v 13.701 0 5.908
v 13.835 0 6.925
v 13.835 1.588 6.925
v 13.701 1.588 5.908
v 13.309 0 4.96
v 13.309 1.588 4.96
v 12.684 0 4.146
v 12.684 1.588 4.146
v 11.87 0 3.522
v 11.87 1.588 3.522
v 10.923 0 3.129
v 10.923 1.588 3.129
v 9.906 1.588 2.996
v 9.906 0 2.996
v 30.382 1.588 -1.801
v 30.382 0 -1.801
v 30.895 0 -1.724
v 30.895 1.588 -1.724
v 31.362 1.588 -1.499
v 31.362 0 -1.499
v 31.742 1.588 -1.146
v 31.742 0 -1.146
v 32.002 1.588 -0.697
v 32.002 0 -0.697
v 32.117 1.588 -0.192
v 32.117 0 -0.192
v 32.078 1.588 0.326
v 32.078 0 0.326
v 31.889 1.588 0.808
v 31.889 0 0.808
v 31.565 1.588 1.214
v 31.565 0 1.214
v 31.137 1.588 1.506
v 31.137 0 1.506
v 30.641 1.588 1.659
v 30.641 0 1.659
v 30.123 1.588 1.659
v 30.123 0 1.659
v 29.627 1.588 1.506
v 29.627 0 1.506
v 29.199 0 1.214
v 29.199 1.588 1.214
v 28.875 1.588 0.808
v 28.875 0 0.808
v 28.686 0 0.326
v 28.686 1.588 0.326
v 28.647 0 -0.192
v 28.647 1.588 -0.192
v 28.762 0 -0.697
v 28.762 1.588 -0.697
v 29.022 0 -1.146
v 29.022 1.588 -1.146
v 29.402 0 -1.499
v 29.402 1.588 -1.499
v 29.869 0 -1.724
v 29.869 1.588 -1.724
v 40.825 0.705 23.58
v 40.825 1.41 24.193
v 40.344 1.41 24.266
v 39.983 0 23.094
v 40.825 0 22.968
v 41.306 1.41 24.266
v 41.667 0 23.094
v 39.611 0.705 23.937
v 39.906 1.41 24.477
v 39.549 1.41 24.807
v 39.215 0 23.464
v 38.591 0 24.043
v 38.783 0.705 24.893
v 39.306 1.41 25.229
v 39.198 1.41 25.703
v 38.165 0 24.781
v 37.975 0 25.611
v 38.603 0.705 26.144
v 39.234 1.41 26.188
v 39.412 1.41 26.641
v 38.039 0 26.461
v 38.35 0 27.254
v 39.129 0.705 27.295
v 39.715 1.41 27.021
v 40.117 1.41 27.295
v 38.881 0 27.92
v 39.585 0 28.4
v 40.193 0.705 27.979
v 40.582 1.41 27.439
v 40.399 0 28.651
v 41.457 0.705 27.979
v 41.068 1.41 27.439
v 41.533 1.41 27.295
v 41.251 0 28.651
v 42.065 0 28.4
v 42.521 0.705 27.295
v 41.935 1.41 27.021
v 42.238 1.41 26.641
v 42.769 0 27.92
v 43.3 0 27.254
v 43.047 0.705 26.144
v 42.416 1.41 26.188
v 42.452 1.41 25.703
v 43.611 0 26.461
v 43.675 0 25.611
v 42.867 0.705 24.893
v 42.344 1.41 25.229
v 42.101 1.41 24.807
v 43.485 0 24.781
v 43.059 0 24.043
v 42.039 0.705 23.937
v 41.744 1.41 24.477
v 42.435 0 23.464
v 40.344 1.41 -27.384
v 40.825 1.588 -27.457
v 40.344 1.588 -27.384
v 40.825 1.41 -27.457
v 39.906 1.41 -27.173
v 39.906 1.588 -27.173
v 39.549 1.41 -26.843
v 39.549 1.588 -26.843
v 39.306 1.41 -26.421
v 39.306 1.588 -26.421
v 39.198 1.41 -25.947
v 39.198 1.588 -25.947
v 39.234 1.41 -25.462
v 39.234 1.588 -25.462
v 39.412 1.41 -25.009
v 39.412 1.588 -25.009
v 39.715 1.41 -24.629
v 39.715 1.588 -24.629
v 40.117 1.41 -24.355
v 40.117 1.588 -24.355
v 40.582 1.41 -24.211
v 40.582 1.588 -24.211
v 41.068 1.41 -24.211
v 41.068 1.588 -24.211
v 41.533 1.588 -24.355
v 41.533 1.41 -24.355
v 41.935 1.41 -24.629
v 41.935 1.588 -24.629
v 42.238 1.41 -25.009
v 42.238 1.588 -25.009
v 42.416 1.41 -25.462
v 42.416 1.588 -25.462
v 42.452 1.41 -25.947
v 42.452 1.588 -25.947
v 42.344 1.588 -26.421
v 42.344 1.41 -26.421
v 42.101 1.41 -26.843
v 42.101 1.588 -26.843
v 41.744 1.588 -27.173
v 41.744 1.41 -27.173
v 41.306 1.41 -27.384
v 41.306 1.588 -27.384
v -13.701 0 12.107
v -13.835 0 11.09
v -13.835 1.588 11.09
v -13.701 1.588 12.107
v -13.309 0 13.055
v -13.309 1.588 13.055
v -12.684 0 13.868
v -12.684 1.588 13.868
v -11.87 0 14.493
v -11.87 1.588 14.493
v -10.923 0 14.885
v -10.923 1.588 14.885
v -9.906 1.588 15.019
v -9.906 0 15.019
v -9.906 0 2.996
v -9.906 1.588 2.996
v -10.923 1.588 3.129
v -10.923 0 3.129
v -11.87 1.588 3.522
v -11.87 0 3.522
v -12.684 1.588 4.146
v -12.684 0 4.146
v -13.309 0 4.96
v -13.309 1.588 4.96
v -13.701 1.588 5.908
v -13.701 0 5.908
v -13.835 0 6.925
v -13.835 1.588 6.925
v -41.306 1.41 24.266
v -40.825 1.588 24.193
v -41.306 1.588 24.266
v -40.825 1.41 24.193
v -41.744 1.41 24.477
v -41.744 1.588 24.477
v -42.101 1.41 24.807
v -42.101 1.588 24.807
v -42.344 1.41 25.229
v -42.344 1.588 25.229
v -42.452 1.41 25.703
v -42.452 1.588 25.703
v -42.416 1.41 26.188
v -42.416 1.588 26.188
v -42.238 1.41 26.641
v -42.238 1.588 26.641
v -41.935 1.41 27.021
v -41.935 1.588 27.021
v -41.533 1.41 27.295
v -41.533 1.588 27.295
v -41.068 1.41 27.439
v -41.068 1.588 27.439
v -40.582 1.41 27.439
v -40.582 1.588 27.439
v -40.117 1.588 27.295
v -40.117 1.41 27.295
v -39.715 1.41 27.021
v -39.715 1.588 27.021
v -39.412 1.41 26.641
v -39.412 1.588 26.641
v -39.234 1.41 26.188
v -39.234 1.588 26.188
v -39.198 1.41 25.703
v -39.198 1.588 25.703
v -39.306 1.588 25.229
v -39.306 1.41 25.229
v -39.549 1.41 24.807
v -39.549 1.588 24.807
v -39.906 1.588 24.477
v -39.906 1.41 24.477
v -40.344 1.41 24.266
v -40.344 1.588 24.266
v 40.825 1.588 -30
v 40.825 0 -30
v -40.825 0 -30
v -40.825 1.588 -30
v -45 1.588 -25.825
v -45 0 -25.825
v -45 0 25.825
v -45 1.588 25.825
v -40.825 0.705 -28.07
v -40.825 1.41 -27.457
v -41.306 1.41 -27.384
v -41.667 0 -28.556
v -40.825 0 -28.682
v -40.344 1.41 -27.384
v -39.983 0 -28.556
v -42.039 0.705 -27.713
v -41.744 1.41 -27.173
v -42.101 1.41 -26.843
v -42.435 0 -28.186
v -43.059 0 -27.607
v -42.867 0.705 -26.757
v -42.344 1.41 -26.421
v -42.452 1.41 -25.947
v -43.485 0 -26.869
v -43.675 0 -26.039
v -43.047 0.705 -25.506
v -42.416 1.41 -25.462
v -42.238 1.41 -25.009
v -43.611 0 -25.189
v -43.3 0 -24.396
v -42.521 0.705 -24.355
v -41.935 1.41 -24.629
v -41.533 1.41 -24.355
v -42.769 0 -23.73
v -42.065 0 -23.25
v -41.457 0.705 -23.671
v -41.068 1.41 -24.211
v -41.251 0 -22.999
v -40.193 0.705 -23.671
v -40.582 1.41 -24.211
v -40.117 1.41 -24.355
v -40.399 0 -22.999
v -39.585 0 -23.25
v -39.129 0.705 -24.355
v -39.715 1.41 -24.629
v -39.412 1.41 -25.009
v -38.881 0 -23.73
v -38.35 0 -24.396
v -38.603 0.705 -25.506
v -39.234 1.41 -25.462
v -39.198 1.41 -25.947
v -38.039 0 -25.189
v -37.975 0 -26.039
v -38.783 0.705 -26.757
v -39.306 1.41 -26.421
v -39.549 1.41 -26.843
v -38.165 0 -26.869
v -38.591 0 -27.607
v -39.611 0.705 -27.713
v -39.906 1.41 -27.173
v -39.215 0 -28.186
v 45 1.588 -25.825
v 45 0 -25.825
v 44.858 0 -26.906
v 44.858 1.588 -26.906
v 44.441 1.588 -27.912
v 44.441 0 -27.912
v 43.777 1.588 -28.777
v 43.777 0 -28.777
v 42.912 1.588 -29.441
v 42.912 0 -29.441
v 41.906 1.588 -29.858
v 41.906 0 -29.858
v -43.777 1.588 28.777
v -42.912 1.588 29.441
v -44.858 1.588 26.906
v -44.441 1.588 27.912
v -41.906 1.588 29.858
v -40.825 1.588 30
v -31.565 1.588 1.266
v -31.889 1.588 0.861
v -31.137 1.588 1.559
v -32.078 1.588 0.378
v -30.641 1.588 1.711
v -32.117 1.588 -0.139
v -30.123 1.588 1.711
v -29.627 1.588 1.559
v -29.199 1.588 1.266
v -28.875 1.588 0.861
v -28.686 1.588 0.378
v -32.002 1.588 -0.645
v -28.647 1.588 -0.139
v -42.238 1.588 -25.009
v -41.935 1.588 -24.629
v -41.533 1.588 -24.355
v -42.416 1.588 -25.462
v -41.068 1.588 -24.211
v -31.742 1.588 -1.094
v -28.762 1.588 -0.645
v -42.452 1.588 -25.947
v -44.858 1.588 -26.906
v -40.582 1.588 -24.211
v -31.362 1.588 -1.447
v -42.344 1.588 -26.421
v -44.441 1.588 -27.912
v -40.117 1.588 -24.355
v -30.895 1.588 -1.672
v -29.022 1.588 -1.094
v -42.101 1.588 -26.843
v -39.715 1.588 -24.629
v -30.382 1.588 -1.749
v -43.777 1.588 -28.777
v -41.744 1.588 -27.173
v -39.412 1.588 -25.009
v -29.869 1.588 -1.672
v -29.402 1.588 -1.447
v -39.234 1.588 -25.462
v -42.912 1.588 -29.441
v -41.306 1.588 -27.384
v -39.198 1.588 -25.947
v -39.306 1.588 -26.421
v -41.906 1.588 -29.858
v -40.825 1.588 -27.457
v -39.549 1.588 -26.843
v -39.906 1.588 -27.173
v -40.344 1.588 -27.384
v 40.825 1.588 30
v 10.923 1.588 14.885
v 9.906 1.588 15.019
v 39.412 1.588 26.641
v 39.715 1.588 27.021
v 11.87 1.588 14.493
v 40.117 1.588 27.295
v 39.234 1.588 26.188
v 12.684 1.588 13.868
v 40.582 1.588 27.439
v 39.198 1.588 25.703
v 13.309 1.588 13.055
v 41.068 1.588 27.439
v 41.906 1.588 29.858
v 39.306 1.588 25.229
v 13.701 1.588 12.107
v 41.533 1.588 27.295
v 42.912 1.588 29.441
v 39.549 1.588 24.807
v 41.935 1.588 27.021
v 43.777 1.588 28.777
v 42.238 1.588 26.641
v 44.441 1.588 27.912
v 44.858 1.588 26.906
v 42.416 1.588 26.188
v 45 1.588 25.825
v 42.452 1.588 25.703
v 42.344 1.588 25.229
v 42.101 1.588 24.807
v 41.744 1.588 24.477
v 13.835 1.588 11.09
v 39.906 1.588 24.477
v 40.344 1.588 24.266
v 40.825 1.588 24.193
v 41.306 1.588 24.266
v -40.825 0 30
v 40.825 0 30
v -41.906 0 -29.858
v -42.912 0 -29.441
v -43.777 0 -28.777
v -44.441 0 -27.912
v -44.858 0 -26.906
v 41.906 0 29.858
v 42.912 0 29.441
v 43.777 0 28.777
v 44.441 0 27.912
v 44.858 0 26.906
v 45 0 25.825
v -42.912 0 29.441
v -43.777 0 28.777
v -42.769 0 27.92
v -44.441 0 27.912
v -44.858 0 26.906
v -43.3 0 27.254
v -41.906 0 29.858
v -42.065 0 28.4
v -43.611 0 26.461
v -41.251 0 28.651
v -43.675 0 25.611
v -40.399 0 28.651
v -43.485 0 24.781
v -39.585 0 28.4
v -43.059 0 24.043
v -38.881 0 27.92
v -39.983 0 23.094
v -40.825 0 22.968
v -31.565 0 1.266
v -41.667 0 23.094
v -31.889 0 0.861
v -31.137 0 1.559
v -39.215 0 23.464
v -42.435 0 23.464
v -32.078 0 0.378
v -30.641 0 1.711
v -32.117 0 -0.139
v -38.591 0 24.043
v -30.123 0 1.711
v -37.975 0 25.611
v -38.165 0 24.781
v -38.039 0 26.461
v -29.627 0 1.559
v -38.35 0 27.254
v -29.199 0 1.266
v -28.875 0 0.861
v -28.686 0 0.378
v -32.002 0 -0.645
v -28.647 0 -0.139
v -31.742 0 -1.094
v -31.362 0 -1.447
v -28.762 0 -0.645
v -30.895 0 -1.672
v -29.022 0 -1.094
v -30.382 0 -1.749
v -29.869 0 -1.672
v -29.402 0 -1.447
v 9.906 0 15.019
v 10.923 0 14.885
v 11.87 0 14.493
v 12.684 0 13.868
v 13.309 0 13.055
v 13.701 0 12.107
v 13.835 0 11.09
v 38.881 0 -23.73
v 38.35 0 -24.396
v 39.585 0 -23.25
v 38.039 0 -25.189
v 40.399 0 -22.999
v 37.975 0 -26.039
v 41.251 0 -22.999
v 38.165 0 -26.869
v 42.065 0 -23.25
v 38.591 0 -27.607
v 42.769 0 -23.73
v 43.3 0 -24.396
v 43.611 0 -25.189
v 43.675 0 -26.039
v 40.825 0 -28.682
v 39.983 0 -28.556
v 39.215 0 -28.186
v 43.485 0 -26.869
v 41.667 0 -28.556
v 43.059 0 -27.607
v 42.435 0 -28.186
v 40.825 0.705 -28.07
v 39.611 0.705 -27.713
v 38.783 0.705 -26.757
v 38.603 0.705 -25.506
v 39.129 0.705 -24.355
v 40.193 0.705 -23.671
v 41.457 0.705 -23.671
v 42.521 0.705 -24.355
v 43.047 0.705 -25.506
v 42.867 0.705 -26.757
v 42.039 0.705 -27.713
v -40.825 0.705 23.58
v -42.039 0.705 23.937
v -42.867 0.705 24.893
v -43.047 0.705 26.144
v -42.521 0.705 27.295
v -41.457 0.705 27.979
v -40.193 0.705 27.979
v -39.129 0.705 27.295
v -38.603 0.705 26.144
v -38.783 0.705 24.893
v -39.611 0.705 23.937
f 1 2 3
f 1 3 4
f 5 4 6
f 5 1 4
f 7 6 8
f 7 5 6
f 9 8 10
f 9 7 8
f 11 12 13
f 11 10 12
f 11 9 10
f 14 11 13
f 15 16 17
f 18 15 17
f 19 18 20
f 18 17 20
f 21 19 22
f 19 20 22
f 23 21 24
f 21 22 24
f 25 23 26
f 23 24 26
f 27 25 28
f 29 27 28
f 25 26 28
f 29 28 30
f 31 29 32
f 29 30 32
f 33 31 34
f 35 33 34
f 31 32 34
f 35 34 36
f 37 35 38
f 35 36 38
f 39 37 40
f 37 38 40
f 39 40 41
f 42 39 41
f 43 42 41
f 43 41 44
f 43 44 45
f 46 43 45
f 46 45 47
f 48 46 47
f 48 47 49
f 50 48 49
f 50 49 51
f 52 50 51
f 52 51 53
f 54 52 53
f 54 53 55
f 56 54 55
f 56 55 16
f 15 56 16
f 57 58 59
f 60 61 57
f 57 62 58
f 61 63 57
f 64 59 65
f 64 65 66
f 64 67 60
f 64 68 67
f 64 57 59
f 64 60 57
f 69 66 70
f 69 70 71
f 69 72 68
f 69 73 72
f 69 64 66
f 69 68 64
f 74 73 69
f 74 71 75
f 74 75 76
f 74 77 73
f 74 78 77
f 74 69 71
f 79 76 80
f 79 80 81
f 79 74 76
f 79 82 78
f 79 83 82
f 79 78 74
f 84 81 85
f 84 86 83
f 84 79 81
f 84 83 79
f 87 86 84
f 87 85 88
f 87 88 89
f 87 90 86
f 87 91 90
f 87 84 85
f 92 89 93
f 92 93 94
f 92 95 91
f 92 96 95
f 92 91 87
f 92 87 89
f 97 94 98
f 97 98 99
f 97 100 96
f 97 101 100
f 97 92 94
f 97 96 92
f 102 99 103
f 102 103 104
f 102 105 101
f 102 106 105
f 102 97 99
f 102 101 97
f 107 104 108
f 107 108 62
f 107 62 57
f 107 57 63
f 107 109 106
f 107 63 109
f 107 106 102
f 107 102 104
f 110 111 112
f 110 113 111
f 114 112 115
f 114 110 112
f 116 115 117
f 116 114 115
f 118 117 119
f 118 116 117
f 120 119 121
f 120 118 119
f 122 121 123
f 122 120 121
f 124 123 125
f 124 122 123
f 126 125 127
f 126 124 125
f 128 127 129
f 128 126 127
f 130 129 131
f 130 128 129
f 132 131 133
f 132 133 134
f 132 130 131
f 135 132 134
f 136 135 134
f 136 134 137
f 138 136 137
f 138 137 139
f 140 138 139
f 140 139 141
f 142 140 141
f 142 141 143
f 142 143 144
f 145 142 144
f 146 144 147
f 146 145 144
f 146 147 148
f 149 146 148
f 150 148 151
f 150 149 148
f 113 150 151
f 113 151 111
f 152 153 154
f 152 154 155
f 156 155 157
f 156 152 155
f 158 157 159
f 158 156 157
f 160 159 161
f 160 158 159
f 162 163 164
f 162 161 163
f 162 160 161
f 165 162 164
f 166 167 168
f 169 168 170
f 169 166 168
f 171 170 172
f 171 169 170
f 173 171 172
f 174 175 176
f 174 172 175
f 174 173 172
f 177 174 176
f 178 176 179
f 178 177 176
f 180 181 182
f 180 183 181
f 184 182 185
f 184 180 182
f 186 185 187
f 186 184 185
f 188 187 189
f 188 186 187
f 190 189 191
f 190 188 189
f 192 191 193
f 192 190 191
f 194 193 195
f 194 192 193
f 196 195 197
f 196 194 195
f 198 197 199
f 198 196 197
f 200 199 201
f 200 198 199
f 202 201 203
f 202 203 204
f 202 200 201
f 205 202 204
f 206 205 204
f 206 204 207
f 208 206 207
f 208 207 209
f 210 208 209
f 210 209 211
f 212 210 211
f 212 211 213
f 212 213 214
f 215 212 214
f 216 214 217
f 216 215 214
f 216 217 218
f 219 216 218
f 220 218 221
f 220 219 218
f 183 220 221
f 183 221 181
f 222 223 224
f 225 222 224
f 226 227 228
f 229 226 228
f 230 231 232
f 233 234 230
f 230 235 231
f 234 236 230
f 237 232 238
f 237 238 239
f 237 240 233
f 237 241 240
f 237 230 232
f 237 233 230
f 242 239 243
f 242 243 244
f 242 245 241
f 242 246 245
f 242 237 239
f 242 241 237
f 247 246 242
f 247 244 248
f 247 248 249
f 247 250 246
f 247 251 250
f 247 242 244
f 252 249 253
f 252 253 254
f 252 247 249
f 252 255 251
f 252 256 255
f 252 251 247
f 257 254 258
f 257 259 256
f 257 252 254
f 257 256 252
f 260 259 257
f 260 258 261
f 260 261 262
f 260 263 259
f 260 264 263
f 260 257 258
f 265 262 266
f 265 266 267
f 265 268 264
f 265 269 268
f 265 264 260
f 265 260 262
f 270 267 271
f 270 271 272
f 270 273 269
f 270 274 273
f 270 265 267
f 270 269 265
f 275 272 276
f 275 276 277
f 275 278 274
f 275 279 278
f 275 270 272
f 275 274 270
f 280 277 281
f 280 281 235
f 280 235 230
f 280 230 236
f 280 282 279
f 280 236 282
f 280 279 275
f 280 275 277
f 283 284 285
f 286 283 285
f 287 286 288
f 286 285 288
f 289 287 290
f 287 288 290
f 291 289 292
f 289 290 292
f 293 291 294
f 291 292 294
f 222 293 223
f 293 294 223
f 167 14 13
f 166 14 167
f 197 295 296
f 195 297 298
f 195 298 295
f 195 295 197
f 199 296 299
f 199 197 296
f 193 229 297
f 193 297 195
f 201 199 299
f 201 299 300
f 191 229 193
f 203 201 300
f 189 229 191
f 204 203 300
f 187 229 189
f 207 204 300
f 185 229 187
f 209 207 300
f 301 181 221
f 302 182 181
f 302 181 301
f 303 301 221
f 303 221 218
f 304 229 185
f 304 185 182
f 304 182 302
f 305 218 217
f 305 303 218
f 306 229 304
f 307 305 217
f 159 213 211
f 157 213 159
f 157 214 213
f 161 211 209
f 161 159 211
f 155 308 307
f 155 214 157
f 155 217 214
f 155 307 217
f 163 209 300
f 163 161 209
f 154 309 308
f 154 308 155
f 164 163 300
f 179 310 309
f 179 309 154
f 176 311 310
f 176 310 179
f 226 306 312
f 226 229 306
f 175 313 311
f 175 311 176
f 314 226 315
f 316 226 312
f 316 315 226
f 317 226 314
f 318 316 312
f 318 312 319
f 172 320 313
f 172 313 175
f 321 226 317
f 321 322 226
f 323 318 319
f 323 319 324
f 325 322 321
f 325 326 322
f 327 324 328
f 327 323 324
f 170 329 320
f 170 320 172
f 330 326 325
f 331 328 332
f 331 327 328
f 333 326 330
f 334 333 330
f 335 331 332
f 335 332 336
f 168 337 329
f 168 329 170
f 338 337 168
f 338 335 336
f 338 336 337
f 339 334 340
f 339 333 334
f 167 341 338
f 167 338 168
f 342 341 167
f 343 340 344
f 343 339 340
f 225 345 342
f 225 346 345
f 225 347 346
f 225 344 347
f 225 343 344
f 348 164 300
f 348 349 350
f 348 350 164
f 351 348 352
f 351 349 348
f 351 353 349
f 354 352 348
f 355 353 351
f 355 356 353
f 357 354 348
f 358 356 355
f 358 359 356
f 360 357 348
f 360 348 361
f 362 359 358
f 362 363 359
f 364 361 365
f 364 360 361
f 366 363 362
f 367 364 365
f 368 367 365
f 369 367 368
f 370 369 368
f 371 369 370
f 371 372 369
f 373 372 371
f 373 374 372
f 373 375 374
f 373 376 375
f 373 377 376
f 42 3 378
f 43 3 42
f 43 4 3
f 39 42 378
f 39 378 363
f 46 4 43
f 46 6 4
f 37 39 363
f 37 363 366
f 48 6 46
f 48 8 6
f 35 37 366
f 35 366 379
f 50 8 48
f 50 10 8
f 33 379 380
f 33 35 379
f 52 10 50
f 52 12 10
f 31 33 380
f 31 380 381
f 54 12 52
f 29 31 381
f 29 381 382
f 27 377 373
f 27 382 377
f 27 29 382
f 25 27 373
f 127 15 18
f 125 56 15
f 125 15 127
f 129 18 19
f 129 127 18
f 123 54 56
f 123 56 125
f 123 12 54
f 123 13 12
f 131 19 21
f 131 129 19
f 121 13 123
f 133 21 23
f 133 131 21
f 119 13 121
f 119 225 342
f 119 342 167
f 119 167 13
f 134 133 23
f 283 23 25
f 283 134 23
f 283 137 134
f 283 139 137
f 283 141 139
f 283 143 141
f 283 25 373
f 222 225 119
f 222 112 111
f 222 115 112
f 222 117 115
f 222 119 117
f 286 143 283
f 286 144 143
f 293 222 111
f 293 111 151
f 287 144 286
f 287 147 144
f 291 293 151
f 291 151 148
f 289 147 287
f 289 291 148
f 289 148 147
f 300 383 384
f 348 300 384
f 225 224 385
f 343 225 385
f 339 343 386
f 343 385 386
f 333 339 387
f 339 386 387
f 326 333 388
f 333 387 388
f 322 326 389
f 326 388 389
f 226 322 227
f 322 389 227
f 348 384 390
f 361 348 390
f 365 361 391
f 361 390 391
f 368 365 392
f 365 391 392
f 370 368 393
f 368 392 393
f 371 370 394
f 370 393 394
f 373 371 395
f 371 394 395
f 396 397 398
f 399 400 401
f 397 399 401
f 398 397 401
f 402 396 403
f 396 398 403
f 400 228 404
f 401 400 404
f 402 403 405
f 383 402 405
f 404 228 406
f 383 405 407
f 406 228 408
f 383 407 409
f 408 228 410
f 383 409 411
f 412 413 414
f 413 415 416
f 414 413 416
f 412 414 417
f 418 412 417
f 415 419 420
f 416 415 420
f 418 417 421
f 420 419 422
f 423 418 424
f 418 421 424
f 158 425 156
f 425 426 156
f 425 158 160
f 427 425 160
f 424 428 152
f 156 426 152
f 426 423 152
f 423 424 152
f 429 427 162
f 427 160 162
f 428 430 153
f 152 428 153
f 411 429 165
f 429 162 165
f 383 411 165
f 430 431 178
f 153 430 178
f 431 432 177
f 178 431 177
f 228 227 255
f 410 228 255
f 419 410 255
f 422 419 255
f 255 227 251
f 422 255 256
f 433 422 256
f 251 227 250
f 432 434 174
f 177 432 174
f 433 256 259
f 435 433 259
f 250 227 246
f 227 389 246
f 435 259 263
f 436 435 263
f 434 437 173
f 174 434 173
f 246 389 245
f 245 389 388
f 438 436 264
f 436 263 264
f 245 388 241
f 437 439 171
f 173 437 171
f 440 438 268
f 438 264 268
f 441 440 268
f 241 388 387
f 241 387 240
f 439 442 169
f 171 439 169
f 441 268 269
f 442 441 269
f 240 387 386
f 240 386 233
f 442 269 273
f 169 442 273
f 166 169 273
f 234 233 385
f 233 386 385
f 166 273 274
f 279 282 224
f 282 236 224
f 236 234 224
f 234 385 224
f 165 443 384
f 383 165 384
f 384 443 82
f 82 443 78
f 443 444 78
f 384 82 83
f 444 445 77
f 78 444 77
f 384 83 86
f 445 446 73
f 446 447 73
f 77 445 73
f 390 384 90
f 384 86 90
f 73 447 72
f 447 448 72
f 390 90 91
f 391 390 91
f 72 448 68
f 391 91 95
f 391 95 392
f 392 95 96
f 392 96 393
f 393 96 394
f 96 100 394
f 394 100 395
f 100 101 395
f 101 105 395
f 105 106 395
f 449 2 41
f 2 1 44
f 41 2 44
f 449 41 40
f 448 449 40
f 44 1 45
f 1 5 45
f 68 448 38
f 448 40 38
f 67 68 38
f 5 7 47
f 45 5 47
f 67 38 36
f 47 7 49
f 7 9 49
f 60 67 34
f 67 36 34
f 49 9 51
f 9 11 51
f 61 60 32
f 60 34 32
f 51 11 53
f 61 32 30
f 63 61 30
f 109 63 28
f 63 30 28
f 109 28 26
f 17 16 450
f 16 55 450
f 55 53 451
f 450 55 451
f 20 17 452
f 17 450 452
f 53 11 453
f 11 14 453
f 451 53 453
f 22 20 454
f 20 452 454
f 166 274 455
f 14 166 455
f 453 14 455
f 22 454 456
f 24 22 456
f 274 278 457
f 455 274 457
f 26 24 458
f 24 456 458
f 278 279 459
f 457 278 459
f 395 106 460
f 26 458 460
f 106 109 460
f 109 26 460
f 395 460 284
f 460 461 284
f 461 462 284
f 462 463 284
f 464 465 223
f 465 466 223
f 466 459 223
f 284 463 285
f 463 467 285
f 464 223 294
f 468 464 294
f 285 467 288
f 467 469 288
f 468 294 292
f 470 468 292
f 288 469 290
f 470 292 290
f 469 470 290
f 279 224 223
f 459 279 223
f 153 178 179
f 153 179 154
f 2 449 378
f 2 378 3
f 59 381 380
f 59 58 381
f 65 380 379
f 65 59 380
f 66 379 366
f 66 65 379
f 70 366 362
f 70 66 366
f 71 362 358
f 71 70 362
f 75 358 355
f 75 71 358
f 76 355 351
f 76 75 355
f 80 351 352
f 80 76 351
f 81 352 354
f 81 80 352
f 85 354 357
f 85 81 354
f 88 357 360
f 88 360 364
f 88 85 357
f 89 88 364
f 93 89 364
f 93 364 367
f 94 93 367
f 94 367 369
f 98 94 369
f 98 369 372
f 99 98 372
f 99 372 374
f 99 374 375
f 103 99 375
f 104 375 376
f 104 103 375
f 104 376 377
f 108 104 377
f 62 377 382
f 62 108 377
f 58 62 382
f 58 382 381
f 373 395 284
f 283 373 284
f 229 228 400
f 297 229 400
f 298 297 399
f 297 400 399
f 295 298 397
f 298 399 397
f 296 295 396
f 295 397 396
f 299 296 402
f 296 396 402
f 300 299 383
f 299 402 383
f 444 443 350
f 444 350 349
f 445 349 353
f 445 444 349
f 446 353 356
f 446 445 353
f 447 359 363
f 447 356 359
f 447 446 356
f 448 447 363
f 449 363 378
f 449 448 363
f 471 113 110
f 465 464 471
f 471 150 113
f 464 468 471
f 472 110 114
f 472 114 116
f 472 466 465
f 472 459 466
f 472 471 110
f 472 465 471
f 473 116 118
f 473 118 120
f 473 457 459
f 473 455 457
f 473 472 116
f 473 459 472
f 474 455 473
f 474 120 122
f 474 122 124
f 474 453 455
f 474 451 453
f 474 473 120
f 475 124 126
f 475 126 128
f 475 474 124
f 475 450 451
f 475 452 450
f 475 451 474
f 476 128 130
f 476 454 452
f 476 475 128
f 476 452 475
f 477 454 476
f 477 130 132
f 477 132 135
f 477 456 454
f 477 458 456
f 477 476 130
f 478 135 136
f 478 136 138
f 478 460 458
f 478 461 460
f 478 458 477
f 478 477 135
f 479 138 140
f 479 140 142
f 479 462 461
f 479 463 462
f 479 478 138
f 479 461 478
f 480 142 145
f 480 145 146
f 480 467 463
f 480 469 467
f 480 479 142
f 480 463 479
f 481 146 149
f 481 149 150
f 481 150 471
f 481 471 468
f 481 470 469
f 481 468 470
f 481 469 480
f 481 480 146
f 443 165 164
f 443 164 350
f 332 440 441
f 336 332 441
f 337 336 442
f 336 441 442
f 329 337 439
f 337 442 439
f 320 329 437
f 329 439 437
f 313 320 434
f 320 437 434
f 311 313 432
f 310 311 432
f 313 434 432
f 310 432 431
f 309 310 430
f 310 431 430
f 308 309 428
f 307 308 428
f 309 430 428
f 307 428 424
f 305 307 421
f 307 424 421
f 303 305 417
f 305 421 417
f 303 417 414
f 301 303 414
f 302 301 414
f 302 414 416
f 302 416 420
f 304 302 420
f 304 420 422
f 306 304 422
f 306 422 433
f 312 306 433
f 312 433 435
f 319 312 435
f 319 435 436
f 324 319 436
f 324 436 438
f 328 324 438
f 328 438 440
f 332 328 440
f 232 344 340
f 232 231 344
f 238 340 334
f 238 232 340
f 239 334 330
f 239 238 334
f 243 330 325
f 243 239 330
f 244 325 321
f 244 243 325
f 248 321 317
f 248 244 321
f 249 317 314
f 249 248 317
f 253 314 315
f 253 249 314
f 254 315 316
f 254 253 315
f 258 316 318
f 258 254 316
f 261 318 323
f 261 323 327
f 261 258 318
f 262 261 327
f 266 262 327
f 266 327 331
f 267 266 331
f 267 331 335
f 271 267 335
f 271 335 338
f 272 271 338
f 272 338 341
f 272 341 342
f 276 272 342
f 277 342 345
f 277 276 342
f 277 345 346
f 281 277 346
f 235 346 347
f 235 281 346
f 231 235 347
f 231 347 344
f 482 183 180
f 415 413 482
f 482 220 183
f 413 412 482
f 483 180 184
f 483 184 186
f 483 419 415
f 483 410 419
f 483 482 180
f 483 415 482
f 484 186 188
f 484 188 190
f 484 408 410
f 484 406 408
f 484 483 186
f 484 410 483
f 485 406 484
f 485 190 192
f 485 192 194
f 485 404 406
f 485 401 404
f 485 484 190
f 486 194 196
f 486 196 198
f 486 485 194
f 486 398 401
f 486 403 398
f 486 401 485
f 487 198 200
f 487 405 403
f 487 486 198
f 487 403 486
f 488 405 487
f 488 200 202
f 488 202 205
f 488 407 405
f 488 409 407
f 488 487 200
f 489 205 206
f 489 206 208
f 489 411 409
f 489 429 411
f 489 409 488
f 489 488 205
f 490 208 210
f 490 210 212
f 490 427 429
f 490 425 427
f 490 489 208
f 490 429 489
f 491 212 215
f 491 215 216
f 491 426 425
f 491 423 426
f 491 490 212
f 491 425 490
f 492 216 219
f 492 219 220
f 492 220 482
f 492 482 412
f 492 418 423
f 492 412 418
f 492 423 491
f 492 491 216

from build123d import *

# Parameters (mm, degrees)
SKETCH2_R                                     = 1
BOSS_EXTRUDE3_DEPTH                           = 1.5875
DB15_PLUG_CUTAWAY_DEPTH                       = 55.106562968
CSK_FOR_4_FLAT_HEAD_MACHINE_SCREW1_AT_2_COUNT = 2
CSK_FOR_4_FLAT_HEAD_MACHINE_SCREW1_AT_2_PITCH = 51.65
CSK_FOR_4_FLAT_HEAD_MACHINE_SCREW1_AT_3_COUNT = 2
CSK_FOR_4_FLAT_HEAD_MACHINE_SCREW1_AT_3_PITCH = 81.65
CSK_FOR_4_FLAT_HEAD_MACHINE_SCREW1_AT_4_COUNT = 2
CSK_FOR_4_FLAT_HEAD_MACHINE_SCREW1_AT_4_PITCH = 96.614931558
SKETCH11_R                                    = 1.7399
CUT_EXTRUDE1_DEPTH                            = 55.106562968


with BuildPart() as part:
    # Sketch2 → Boss-Extrude3 (new body)
    with BuildSketch(Plane(origin=(0, 0, 0), x_dir=(1, 0, 0), z_dir=(0, 1, 0))):
        with BuildLine():
            Line((-45, 25.825), (-45, -25.825))
            ThreePointArc((-45, -25.825), (-43.777170811, -28.777170811), (-40.825, -30))
            Line((-40.825, -30), (40.825, -30))
            ThreePointArc((40.825, -30), (43.777170811, -28.777170811), (45, -25.825))
            Line((45, -25.825), (45, 25.825))
            ThreePointArc((45, 25.825), (43.777170811, 28.777170811), (40.825, 30))
            Line((40.825, 30), (-40.825, 30))
            ThreePointArc((-40.825, 30), (-43.777170811, 28.777170811), (-45, 25.825))
        make_face()
        with Locations(Location((40.825, 25.825, 0), (0, 0, 270))):
            Circle(SKETCH2_R, mode=Mode.SUBTRACT)
        with Locations(Location((-40.825, 25.825, 0), (0, 0, 270))):
            Circle(SKETCH2_R, mode=Mode.SUBTRACT)
        with Locations(Location((-40.825, -25.825, 0), (0, 0, 270))):
            Circle(SKETCH2_R, mode=Mode.SUBTRACT)
        with Locations(Location((40.825, -25.825, 0), (0, 0, 270))):
            Circle(SKETCH2_R, mode=Mode.SUBTRACT)
    extrude(amount=BOSS_EXTRUDE3_DEPTH)

    # Sketch4 → DB15 Plug Cutaway (cut, through all)
    with BuildSketch(Plane.XZ):
        with BuildLine():
            Line((-13.835, 6.924614493), (-13.835, 11.090214492))
            ThreePointArc((-13.835, 11.090214492), (-12.684222543, 13.868437036), (-9.905999998, 15.019214492))
            Line((-9.905999998, 15.019214492), (9.905999999, 15.019214492))
            ThreePointArc((9.905999999, 15.019214492), (12.684222543, 13.868437035), (13.835, 11.090214492))
            Line((13.835, 11.090214492), (13.835, 6.924614492))
            ThreePointArc((13.835, 6.924614492), (12.684222543, 4.146391949), (9.906, 2.995614492))
            Line((9.906, 2.995614492), (-9.905999998, 2.995614492))
            ThreePointArc((-9.905999998, 2.995614492), (-12.684222543, 4.146391948), (-13.835, 6.924614493))
        make_face()
    extrude(amount=-DB15_PLUG_CUTAWAY_DEPTH, mode=Mode.SUBTRACT)

    # Sketch9 → CSK for #4 Flat Head Machine Screw1 (revolve, cut)
    with BuildSketch(Plane(origin=(-40.825, 0, 25.825), x_dir=(0, 0, -1), z_dir=(1, 0, 0))):
        Polygon((0, 0), (0, 1.5875), (1.63195, 1.5875), (1.63195, 1.409834001), (2.8575, 0), align=None)
    csk_for_4_flat_head_machine_screw1 = revolve(axis=Axis((-40.825, -6.35, 25.825), (0, 1, 0)), mode=Mode.SUBTRACT)

    # CSK for #4 Flat Head Machine Screw1 at 2: CSK for #4 Flat Head Machine Screw1 ×2
    with Locations(*[(0, 0, -i * CSK_FOR_4_FLAT_HEAD_MACHINE_SCREW1_AT_2_PITCH) for i in range(1, CSK_FOR_4_FLAT_HEAD_MACHINE_SCREW1_AT_2_COUNT)]):
        add(csk_for_4_flat_head_machine_screw1, mode=Mode.SUBTRACT)

    # CSK for #4 Flat Head Machine Screw1 at 3: CSK for #4 Flat Head Machine Screw1 ×2
    with Locations(*[(i * CSK_FOR_4_FLAT_HEAD_MACHINE_SCREW1_AT_3_PITCH, 0, 0) for i in range(1, CSK_FOR_4_FLAT_HEAD_MACHINE_SCREW1_AT_3_COUNT)]):
        add(csk_for_4_flat_head_machine_screw1, mode=Mode.SUBTRACT)

    # CSK for #4 Flat Head Machine Screw1 at 4: CSK for #4 Flat Head Machine Screw1 ×2
    with Locations(*[Vector(0.8451074661352507, 0, -0.5345964559202167) * (i * CSK_FOR_4_FLAT_HEAD_MACHINE_SCREW1_AT_4_PITCH) for i in range(1, CSK_FOR_4_FLAT_HEAD_MACHINE_SCREW1_AT_4_COUNT)]):
        add(csk_for_4_flat_head_machine_screw1, mode=Mode.SUBTRACT)

    # Sketch11 → Cut-Extrude1 (cut, through all)
    with BuildSketch(Plane.XZ):
        with Locations(Location((-30.382, -0.009017528, 0), (0, 0, 270))):
            Circle(SKETCH11_R)
        with Locations(Location((30.382, -0.061487226, 0), (0, 0, 270))):
            Circle(SKETCH11_R)
    extrude(amount=-CUT_EXTRUDE1_DEPTH, mode=Mode.SUBTRACT)


solid = part.part
